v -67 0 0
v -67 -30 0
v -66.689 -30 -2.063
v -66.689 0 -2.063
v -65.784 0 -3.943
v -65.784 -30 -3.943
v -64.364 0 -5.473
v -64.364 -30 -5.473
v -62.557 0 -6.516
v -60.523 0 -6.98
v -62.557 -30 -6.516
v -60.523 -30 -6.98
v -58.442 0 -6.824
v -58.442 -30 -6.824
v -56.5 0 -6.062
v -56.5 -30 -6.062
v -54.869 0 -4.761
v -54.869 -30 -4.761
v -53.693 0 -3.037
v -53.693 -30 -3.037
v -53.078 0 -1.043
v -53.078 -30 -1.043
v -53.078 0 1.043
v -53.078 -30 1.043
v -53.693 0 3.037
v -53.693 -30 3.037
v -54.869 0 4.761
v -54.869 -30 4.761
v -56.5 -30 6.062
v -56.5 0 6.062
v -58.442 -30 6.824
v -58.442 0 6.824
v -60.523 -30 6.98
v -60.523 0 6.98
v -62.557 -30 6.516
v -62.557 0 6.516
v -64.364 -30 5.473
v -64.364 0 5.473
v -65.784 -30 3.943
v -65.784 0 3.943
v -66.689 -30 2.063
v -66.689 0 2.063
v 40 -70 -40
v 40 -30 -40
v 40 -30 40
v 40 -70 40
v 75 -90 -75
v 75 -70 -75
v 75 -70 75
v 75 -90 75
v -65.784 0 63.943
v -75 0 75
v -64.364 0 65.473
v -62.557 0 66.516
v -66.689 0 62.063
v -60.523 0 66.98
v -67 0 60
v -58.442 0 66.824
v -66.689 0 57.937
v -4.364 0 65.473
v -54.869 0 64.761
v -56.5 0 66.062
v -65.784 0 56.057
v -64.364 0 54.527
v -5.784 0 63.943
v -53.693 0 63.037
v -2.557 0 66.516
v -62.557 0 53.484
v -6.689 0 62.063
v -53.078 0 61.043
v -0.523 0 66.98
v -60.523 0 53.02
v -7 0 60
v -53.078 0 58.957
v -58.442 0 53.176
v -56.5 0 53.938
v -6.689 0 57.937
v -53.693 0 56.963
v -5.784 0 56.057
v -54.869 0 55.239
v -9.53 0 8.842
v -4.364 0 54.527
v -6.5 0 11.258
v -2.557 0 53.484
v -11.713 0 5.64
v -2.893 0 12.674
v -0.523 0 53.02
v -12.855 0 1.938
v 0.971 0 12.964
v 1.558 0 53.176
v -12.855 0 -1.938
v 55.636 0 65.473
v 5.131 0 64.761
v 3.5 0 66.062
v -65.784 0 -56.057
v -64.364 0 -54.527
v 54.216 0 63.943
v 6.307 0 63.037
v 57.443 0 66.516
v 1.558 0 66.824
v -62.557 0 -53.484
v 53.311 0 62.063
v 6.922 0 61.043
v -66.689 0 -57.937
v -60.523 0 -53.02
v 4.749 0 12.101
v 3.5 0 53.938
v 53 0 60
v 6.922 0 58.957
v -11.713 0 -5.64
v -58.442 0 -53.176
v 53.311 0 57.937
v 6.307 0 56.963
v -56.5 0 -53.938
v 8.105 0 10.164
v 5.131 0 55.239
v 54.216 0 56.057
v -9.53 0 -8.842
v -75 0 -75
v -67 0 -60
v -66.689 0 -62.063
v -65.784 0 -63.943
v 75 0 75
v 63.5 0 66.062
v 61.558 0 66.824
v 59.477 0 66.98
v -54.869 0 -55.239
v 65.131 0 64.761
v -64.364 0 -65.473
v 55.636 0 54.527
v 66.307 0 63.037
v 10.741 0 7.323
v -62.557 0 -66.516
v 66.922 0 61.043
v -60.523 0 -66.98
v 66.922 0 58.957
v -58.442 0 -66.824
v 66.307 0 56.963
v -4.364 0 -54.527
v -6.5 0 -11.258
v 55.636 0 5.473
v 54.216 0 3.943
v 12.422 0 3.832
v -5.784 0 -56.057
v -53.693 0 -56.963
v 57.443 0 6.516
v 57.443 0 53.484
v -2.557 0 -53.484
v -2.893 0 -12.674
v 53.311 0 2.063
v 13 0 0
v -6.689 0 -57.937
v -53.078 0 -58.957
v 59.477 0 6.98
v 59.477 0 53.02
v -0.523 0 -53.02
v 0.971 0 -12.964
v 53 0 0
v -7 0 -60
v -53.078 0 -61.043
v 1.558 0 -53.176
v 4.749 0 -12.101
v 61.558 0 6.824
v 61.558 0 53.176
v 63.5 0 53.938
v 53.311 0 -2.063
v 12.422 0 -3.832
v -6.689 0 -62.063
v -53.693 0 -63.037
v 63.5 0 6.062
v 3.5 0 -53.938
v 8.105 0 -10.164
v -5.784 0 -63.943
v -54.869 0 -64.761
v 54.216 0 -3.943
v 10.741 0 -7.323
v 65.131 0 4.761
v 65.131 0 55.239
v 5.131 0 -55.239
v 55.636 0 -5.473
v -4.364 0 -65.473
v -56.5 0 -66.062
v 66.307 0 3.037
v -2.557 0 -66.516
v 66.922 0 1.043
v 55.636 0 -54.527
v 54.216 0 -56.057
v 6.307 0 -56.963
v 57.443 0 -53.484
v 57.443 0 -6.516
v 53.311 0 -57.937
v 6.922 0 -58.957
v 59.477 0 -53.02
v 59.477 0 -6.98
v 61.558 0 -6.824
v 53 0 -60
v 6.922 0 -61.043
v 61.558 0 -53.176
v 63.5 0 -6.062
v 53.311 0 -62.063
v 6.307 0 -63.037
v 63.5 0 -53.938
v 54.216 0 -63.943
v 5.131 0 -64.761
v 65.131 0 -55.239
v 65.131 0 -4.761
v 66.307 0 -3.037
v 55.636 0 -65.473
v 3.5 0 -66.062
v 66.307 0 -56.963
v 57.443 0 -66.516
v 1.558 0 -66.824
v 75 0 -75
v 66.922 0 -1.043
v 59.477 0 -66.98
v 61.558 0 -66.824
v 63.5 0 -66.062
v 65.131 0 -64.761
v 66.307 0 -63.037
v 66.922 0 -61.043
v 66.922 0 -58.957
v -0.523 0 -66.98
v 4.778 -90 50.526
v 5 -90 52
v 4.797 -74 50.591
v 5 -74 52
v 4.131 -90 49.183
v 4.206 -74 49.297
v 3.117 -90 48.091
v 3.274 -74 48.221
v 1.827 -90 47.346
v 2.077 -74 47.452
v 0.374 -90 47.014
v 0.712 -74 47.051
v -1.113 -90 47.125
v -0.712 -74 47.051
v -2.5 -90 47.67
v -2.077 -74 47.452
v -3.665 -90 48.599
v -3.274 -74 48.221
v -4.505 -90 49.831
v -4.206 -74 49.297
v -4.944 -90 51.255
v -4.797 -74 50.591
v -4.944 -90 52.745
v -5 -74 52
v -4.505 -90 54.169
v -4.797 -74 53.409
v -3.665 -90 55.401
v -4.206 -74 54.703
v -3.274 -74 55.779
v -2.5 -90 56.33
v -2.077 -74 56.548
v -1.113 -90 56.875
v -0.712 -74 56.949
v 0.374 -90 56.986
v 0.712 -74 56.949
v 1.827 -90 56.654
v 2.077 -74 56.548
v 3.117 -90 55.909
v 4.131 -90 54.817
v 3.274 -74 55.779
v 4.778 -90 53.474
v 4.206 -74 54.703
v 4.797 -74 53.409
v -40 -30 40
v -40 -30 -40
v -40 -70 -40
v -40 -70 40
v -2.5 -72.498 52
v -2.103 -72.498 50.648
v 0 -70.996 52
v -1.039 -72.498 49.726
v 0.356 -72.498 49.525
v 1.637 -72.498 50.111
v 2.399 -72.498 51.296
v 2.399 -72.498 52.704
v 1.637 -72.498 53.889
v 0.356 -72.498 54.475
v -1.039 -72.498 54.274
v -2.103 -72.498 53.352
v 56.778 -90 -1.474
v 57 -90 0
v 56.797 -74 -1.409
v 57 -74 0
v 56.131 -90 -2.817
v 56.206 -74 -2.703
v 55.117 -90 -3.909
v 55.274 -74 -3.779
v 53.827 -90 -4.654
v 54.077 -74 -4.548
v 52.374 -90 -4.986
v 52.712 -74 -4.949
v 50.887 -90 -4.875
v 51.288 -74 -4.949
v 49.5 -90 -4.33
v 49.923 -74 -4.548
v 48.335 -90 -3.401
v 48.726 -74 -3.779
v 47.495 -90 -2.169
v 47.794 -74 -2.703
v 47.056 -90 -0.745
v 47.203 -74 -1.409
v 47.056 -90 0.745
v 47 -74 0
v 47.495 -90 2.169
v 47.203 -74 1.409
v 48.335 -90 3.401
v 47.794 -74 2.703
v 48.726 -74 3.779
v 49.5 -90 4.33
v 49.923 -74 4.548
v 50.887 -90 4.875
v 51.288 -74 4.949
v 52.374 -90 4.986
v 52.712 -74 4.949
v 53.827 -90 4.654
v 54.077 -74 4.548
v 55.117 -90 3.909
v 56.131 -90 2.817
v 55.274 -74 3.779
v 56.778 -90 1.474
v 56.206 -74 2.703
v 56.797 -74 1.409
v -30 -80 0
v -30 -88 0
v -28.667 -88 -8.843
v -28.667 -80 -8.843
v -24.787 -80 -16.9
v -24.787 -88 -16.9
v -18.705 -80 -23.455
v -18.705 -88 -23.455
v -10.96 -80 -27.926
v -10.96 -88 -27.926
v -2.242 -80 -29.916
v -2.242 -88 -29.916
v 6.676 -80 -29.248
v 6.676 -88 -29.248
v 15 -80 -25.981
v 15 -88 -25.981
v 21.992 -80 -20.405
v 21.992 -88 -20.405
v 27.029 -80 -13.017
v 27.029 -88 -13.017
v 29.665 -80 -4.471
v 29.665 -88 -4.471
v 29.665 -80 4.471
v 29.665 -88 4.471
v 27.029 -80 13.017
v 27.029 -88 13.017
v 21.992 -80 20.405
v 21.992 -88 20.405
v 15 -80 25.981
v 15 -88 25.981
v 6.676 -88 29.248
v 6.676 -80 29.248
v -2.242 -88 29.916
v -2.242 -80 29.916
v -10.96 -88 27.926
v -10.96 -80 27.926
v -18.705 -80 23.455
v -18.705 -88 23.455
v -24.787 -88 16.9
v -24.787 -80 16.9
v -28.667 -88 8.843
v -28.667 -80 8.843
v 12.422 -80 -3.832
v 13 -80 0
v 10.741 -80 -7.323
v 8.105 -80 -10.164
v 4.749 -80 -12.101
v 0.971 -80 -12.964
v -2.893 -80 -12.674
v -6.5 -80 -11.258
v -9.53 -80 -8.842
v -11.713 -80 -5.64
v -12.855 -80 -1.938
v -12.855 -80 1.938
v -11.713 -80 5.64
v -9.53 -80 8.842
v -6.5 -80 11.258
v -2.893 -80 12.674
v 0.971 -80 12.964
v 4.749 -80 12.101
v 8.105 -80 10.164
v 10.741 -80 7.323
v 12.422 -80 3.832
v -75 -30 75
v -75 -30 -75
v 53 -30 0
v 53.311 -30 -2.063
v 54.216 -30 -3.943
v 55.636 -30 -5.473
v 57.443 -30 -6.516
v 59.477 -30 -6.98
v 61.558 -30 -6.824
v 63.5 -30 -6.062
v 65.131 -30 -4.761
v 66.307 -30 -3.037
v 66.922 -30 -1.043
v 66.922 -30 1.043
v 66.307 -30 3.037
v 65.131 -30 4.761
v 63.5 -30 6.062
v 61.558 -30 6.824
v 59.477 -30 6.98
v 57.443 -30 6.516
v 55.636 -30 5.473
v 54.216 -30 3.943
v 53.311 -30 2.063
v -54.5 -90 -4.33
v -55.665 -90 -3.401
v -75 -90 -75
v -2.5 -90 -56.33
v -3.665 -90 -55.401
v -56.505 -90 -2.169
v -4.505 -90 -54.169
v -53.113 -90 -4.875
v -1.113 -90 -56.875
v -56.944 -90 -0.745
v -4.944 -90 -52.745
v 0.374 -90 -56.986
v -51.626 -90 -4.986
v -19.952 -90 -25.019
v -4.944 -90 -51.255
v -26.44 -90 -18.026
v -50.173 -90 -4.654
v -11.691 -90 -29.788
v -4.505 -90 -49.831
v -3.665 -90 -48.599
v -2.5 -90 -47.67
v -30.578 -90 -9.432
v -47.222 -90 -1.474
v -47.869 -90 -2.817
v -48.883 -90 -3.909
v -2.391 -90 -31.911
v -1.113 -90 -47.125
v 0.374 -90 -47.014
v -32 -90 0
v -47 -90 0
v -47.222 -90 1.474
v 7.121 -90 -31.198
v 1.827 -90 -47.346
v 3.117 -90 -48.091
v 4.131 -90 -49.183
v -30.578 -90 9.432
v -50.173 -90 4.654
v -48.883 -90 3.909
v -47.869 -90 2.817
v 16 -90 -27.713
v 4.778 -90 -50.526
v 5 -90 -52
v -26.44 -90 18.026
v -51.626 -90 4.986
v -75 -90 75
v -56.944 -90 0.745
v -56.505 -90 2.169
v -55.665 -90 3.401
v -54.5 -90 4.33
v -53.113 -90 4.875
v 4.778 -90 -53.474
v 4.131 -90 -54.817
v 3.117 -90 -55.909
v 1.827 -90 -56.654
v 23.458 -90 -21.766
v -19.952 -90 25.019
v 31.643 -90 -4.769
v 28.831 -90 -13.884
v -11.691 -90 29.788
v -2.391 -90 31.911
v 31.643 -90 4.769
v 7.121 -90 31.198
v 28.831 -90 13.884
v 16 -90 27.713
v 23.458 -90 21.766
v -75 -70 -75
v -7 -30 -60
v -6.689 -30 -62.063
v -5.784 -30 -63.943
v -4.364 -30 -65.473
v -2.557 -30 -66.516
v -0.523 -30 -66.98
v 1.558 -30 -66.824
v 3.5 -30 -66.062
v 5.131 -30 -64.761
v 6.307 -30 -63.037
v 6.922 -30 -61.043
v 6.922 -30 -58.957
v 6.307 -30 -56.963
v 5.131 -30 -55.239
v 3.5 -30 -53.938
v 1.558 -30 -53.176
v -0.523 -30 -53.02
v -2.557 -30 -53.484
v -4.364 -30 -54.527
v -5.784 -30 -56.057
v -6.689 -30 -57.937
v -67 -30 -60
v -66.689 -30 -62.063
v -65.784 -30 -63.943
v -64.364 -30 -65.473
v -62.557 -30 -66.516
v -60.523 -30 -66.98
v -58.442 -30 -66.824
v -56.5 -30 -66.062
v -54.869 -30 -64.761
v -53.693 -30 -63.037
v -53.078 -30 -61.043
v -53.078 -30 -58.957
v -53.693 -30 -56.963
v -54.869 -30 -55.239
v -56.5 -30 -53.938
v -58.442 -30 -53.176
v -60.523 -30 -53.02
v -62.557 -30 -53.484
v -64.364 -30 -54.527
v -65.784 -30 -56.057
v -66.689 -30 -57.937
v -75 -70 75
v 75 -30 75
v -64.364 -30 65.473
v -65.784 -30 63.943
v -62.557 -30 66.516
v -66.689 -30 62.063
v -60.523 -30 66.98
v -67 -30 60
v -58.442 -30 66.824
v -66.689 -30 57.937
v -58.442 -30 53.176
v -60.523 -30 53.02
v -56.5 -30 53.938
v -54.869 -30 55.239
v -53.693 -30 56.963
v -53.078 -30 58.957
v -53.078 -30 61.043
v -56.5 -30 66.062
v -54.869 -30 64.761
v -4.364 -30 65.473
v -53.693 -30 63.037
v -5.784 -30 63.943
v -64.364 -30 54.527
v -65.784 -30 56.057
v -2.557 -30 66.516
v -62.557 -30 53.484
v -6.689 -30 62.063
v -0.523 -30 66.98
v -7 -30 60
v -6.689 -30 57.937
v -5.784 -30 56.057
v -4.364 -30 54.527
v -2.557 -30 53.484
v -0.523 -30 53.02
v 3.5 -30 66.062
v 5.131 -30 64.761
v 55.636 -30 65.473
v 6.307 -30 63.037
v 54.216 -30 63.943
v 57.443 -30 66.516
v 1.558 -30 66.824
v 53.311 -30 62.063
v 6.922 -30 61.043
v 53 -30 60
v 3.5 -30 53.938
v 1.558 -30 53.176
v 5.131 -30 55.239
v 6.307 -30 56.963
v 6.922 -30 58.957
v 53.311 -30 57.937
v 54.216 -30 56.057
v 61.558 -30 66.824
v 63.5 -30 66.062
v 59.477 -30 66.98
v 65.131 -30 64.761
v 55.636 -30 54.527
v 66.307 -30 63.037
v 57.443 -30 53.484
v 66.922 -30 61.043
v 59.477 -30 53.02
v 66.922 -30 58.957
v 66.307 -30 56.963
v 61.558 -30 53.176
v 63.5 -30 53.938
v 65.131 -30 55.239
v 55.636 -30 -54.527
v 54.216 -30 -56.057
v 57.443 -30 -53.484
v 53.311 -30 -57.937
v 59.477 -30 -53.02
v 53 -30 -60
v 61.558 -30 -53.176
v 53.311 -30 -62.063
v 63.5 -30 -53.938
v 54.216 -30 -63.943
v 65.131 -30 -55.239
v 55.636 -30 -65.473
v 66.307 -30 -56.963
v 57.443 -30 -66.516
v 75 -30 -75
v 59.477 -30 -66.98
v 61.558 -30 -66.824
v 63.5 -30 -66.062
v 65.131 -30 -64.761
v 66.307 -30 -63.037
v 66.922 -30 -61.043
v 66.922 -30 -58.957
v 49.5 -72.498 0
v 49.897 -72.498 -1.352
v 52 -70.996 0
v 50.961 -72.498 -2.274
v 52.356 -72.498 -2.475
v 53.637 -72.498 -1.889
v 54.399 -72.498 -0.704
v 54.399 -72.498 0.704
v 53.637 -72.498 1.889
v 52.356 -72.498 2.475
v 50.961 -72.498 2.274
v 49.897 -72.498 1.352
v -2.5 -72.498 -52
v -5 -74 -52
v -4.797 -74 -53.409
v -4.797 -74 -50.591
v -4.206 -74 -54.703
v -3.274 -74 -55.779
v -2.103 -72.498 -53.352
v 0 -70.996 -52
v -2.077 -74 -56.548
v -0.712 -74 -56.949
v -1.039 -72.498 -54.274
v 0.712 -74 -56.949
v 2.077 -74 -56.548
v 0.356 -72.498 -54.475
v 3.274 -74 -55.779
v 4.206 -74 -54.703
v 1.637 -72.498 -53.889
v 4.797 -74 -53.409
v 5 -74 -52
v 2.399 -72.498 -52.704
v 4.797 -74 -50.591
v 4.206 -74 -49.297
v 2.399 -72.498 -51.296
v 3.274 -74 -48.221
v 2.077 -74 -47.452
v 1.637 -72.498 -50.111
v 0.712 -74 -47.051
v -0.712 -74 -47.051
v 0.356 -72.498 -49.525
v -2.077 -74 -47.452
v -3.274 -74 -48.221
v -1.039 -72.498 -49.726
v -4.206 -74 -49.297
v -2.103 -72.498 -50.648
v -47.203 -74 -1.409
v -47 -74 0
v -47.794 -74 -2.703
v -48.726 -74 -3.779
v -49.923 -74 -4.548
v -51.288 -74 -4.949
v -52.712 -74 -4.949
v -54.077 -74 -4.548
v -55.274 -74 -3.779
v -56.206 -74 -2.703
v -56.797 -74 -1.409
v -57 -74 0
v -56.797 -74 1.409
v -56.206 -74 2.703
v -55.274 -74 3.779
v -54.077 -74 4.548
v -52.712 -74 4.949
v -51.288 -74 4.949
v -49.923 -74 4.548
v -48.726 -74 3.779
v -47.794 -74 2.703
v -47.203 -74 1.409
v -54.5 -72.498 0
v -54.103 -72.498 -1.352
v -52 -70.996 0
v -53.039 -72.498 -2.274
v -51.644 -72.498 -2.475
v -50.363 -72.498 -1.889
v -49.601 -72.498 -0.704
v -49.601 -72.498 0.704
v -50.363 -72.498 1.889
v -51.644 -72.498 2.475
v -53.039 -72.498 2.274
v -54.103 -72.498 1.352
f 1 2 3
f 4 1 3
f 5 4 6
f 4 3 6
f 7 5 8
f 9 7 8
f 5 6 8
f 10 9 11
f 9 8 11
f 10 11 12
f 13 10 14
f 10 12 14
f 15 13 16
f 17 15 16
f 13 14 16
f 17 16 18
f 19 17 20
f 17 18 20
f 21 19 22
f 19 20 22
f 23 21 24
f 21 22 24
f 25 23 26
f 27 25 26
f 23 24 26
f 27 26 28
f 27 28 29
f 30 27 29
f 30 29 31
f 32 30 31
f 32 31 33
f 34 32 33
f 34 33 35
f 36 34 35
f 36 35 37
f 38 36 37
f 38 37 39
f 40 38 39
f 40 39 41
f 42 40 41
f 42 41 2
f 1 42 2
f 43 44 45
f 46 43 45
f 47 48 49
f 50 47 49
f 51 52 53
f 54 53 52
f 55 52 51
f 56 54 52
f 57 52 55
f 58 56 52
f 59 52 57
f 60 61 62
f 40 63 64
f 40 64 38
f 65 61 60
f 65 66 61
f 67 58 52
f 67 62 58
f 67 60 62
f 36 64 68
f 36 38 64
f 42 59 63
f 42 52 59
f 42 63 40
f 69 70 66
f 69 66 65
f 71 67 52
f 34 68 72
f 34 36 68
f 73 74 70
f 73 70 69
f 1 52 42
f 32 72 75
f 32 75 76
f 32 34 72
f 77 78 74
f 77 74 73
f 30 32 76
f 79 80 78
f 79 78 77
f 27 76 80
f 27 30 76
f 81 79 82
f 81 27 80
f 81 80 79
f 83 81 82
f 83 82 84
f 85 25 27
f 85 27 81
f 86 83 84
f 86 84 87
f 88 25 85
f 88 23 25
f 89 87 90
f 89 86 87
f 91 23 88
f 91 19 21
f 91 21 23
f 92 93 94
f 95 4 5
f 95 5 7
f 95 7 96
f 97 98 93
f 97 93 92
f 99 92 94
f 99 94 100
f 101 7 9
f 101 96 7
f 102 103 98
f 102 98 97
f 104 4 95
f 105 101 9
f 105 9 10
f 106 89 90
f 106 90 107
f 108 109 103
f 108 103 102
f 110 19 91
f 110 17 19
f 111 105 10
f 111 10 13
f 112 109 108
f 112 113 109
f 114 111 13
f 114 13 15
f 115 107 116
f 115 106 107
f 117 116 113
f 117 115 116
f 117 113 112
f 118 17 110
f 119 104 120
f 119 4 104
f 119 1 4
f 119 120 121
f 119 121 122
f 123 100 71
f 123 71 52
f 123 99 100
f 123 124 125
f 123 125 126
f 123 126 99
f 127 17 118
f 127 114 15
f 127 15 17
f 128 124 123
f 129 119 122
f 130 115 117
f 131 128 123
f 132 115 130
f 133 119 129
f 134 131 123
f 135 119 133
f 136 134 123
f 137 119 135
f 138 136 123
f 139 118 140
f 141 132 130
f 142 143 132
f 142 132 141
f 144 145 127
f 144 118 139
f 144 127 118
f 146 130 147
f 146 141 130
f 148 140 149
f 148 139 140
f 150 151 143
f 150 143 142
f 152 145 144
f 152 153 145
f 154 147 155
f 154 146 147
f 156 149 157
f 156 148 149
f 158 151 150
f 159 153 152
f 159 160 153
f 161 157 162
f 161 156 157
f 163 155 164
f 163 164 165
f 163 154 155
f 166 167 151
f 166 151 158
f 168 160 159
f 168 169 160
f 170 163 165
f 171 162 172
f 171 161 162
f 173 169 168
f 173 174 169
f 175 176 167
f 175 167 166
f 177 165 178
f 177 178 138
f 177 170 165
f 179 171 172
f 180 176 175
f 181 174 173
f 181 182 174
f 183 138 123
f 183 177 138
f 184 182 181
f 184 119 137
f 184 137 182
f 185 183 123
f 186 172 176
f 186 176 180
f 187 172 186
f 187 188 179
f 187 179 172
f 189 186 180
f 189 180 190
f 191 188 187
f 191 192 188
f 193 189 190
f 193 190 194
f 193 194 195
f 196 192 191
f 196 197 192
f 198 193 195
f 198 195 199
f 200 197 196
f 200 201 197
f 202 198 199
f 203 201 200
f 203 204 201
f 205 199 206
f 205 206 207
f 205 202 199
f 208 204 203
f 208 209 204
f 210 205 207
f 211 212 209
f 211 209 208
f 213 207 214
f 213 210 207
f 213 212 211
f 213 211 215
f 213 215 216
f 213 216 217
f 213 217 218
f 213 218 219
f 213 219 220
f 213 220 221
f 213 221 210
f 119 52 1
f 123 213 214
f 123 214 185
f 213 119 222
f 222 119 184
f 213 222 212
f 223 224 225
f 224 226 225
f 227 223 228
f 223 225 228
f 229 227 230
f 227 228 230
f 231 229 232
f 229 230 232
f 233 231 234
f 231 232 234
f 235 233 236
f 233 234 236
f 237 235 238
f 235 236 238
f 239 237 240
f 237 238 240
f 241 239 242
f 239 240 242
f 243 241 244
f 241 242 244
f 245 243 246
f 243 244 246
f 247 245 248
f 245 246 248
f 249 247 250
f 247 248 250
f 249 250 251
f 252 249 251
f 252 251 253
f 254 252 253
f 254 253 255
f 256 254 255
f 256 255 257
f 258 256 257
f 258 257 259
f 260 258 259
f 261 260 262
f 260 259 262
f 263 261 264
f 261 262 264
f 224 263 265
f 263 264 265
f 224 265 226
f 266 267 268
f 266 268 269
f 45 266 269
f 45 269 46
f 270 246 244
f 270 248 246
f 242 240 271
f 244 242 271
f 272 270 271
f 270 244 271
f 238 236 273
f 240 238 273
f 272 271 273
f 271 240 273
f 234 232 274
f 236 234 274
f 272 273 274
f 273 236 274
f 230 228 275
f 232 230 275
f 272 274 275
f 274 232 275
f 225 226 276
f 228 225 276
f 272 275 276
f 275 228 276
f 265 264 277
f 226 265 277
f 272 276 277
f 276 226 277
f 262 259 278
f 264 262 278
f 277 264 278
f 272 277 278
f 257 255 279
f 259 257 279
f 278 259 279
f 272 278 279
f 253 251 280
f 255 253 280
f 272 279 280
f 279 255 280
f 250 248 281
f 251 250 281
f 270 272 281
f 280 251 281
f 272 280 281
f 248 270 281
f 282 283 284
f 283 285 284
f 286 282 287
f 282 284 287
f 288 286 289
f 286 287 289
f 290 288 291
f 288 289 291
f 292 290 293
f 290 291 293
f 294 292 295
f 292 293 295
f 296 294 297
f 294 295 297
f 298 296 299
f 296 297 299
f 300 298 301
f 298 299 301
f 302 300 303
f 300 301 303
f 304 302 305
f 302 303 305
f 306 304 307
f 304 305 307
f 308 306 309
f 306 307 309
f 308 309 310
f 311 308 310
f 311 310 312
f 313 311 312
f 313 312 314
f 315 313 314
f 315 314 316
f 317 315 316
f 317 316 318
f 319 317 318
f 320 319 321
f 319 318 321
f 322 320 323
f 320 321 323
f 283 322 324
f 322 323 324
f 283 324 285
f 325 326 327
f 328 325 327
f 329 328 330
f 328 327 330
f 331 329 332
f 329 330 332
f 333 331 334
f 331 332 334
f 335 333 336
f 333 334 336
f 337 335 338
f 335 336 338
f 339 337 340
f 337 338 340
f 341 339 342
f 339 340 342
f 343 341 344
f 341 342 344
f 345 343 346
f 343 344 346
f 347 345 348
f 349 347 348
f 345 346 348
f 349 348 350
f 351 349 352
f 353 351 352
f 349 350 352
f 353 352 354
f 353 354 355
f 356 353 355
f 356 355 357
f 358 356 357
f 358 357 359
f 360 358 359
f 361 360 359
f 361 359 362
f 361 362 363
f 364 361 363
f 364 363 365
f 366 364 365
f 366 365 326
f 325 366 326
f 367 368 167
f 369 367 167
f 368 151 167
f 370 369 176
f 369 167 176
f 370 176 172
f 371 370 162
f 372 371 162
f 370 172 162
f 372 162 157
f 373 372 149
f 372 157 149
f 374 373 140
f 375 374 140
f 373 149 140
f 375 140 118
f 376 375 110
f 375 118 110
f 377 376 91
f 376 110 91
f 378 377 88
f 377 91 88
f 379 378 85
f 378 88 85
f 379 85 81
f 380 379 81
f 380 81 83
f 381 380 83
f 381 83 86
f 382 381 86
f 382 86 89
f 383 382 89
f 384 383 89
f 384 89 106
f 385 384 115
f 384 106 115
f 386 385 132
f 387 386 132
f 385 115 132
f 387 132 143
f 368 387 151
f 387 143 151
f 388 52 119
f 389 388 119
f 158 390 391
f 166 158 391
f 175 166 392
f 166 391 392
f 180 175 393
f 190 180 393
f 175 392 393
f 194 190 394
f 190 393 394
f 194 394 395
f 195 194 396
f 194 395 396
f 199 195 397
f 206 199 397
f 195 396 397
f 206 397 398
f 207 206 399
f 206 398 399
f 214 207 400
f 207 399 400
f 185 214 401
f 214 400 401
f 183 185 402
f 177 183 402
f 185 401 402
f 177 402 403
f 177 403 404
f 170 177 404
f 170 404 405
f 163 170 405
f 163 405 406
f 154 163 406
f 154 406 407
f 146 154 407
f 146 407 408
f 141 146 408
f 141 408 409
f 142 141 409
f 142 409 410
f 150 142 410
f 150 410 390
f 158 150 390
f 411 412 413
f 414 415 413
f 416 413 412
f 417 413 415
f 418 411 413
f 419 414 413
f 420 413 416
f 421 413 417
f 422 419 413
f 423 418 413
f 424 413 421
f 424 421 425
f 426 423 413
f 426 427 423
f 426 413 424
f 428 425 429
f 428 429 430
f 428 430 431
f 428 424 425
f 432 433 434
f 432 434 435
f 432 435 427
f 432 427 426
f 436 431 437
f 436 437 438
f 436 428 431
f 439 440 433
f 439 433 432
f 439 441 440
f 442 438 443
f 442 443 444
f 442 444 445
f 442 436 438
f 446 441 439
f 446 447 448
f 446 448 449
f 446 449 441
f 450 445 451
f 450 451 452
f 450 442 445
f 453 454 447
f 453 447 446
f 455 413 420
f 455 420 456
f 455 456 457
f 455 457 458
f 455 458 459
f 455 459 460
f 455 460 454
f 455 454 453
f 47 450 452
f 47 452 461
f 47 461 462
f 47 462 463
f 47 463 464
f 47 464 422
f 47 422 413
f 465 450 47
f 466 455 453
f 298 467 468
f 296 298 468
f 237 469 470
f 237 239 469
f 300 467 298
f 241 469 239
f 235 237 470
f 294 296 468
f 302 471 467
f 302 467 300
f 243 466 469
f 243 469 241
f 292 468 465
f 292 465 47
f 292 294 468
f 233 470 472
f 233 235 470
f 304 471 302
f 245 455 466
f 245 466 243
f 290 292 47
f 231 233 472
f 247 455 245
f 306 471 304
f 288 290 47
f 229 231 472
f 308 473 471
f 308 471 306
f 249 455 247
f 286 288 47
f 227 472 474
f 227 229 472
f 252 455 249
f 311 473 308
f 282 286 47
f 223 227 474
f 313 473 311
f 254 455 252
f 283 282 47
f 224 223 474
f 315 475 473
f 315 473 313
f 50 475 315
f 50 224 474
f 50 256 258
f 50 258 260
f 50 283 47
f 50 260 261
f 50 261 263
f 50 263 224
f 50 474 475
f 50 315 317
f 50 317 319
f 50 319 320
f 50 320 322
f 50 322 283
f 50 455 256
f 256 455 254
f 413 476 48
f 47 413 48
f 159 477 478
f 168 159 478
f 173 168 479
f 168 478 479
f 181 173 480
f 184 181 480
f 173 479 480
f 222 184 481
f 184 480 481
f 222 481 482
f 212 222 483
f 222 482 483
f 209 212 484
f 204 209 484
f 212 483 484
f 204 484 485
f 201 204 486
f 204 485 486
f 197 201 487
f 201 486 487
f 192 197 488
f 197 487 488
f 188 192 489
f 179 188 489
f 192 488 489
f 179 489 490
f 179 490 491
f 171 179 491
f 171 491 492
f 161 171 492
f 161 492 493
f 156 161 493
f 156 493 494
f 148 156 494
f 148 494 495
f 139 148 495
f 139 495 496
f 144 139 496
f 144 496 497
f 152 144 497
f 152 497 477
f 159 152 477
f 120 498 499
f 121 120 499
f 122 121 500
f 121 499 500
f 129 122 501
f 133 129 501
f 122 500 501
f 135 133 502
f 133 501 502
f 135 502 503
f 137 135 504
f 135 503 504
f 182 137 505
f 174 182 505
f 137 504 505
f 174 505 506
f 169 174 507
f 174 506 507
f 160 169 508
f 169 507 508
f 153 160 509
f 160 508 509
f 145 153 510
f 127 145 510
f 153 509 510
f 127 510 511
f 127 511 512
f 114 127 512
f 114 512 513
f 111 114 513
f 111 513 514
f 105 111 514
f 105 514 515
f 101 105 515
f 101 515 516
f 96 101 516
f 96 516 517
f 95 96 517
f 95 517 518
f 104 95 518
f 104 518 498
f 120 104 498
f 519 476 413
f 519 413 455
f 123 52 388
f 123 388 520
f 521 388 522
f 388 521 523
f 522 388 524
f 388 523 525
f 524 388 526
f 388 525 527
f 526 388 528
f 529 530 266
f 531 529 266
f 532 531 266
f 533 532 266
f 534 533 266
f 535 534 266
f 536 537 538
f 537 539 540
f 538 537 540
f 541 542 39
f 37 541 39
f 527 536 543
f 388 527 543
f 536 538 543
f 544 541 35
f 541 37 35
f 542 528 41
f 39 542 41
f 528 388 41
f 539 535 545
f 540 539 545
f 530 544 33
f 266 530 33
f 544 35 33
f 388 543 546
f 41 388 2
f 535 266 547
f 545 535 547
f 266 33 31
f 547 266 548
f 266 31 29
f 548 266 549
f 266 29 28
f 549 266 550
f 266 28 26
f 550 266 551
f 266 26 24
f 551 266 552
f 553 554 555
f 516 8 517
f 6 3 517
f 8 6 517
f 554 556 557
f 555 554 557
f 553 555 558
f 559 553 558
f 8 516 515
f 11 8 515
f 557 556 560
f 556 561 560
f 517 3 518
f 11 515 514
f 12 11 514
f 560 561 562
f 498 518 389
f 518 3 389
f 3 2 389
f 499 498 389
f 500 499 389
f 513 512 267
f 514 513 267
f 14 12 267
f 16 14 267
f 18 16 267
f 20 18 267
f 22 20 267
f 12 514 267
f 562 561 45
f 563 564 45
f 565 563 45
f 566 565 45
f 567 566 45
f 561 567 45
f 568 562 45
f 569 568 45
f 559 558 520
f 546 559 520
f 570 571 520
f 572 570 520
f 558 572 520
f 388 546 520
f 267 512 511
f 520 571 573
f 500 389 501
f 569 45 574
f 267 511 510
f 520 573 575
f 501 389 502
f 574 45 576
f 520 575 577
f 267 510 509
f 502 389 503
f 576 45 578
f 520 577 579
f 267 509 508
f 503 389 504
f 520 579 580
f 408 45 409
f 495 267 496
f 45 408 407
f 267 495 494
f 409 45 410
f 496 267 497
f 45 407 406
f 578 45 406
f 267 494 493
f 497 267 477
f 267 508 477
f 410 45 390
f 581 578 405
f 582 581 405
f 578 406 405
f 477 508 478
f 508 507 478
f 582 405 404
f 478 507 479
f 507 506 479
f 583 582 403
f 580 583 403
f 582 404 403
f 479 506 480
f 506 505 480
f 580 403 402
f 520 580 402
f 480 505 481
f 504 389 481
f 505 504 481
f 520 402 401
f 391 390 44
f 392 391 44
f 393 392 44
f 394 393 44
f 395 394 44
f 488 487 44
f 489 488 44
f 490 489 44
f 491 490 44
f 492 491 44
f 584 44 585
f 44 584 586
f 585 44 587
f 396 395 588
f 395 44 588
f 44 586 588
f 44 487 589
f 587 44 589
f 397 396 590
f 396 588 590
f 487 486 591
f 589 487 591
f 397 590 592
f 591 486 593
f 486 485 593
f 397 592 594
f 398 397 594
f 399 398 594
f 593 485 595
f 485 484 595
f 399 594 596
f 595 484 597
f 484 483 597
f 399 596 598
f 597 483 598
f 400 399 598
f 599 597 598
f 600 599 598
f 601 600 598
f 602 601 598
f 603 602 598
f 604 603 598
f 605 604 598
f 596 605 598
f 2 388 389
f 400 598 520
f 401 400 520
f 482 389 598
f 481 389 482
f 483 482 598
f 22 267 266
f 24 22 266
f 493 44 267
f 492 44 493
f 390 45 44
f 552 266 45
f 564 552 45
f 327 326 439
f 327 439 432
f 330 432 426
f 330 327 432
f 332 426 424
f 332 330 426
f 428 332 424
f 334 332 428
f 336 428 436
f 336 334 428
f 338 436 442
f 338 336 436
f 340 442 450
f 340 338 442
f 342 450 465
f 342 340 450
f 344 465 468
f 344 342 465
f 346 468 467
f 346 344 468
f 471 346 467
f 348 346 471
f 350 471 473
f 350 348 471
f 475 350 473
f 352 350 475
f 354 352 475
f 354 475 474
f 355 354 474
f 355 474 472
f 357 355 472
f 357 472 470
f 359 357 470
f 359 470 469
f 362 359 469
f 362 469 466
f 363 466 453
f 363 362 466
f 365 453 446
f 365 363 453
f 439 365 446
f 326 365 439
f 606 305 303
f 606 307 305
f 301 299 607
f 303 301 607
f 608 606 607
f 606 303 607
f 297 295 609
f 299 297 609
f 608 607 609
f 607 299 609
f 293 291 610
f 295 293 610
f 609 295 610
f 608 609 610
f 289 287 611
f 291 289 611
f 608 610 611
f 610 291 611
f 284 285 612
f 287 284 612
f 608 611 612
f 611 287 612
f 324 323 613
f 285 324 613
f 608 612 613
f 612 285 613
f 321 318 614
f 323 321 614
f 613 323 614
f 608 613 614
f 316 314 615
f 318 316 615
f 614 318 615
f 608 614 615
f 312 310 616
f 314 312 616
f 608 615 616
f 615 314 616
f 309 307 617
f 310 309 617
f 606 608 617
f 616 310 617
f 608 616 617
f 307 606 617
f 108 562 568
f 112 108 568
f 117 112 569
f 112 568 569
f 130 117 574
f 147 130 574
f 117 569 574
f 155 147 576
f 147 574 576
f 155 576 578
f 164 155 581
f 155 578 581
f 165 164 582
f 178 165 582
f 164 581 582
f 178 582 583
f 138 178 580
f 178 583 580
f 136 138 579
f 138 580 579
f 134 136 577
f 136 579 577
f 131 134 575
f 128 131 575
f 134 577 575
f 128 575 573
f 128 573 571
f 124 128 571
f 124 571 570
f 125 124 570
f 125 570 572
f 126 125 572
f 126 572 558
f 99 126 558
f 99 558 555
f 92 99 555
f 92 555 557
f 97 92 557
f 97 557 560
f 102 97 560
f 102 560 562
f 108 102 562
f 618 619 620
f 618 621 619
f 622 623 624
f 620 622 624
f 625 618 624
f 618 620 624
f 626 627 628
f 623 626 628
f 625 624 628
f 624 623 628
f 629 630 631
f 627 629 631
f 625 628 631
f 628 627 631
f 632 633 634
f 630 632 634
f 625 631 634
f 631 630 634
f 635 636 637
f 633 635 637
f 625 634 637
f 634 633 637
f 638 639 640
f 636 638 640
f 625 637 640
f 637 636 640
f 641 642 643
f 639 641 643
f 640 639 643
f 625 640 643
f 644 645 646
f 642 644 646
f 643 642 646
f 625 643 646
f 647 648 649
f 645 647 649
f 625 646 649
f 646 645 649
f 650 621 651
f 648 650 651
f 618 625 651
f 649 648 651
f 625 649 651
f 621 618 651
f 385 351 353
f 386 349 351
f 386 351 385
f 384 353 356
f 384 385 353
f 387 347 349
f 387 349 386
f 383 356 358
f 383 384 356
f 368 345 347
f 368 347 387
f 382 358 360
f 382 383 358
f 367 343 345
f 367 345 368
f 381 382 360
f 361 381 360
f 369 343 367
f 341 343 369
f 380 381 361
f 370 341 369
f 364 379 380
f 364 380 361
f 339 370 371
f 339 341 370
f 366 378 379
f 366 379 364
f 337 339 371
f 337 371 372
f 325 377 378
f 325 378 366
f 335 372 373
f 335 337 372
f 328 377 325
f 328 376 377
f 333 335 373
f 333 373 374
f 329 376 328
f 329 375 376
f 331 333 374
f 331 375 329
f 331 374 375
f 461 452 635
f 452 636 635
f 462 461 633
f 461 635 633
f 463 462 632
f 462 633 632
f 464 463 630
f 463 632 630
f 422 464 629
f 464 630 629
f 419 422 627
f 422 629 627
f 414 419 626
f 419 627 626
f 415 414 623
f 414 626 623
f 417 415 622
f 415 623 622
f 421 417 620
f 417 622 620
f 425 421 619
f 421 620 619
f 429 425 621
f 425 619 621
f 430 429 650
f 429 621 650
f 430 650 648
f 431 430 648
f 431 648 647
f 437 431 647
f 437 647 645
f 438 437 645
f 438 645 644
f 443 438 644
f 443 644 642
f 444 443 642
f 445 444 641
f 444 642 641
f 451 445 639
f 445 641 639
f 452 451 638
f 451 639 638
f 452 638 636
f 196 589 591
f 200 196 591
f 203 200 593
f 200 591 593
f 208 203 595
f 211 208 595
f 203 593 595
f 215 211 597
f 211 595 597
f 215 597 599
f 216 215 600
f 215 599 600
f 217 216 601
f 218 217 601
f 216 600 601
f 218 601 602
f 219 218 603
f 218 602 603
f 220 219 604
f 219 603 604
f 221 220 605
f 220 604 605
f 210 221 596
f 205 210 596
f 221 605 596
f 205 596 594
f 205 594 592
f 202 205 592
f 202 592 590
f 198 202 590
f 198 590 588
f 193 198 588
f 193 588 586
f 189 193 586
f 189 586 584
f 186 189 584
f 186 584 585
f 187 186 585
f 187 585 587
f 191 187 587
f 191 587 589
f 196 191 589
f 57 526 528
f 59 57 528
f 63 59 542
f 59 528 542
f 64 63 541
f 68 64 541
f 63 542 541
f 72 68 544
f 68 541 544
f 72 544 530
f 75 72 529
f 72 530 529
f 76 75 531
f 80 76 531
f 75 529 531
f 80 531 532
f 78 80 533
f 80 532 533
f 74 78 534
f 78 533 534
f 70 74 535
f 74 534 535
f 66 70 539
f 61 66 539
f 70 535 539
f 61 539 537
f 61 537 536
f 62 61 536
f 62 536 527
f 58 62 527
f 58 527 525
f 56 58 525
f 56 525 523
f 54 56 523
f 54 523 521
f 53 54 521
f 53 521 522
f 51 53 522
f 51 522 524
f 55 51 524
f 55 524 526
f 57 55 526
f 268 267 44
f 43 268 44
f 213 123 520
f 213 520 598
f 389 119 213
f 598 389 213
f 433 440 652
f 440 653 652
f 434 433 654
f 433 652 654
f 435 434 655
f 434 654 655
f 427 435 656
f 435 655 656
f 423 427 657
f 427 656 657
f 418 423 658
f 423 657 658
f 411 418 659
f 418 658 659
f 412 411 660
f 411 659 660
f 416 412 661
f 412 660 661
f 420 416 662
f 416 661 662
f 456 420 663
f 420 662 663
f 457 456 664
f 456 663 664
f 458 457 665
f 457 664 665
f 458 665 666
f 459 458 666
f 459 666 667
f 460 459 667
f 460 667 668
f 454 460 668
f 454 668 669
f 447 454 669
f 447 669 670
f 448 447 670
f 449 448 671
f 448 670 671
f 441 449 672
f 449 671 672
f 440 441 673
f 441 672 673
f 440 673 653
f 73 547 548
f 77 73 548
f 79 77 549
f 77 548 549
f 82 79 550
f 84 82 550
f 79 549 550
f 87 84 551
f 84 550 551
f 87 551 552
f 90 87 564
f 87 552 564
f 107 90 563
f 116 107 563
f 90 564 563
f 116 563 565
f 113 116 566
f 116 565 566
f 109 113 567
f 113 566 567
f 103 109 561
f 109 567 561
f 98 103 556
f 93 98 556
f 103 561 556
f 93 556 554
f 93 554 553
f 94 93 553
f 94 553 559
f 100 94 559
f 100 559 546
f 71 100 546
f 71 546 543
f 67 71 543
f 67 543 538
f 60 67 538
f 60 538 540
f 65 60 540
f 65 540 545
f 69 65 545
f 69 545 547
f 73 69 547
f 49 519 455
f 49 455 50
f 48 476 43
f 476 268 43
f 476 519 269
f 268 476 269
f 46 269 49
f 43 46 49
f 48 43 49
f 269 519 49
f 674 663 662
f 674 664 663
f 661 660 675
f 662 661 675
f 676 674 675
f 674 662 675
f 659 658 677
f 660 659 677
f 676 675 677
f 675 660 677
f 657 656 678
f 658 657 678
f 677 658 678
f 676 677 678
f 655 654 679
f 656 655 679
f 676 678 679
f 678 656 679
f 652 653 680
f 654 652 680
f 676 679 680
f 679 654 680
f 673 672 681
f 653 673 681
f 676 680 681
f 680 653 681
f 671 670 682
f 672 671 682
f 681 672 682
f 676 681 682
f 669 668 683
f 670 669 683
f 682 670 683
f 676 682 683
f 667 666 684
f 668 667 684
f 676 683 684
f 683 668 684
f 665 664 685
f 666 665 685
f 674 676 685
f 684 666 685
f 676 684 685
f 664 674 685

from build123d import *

# Parameters (mm, degrees)
SKETCH2_W                      = 150
SKETCH2_H                      = 150
BOSS_EXTRUDE1_DEPTH            = 30
SKETCH3_W                      = 80
SKETCH3_H                      = 80
BOSS_EXTRUDE2_DEPTH            = 40
SKETCH4_W                      = 150
SKETCH4_H                      = 150
BOSS_EXTRUDE3_DEPTH            = 20
HOLE1_D                        = 26
HOLE1_DEPTH                    = 100
HOLE1_CBORE_D                  = 60
HOLE1_CBORE_DEPTH              = 10
M16_TAPPED_HOLE2_D             = 14
M16_TAPPED_HOLE2_DEPTH         = 30
F_10_0_10_DIAMETER_HOLE1_D     = 10
F_10_0_10_DIAMETER_HOLE1_DEPTH = 16
F_10_0_10_DIAMETER_HOLE1_TIP   = 3.004303095
CHAMFER1_SIZE                  = 2


with BuildPart() as part:
    # Sketch2 → Boss-Extrude1 (new body)
    with BuildSketch(Plane(origin=(0, 0, 0), x_dir=(1, 0, 0), z_dir=(0, 1, 0))):
        Rectangle(SKETCH2_W, SKETCH2_H)
    extrude(amount=-BOSS_EXTRUDE1_DEPTH)

    # Sketch3 → Boss-Extrude2 (add)
    with BuildSketch(Plane.XZ.offset(30)):
        Rectangle(SKETCH3_W, SKETCH3_H)
    extrude(amount=BOSS_EXTRUDE2_DEPTH)

    # Sketch4 → Boss-Extrude3 (add)
    with BuildSketch(Plane.XZ.offset(70)):
        Rectangle(SKETCH4_W, SKETCH4_H)
    extrude(amount=BOSS_EXTRUDE3_DEPTH)

    # Hole1
    with Locations(Plane(origin=(0, -90, 0), x_dir=(-1, 0, 0), z_dir=(0, -1, 0))):
        with Locations((0, 0)):
            CounterBoreHole(HOLE1_D / 2, HOLE1_CBORE_D / 2, HOLE1_CBORE_DEPTH, depth=HOLE1_DEPTH)

    # M16 Tapped Hole2
    with Locations(Plane(origin=(0, 0, 0), x_dir=(1, 0, 0), z_dir=(0, 1, 0))):
        with Locations((60, -60), (-60, 60), (-60, -60), (60, 60), (0, 60), (-60, 0), (0, -60), (60, 0)):
            Hole(M16_TAPPED_HOLE2_D / 2, depth=M16_TAPPED_HOLE2_DEPTH)

    # Ø10.0 (10) Diameter Hole1
    with Locations(Plane(origin=(0, -90, 0), x_dir=(-1, 0, 0), z_dir=(0, -1, 0))):
        with Locations((-52, 0), (0, -52), (52, 0), (0, 52)):
            Hole(F_10_0_10_DIAMETER_HOLE1_D / 2, depth=F_10_0_10_DIAMETER_HOLE1_DEPTH)
            with Locations((0, 0, -(F_10_0_10_DIAMETER_HOLE1_DEPTH + F_10_0_10_DIAMETER_HOLE1_TIP / 2))):  # 118° drill point
                Cone(0, F_10_0_10_DIAMETER_HOLE1_D / 2, F_10_0_10_DIAMETER_HOLE1_TIP, mode=Mode.SUBTRACT)

    # Chamfer1
    chamfer1_edges = [part.edges().sort_by_distance(p)[0] for p in [
        (30, -90, 0),
    ]]
    chamfer(chamfer1_edges, length=CHAMFER1_SIZE)


solid = part.part
